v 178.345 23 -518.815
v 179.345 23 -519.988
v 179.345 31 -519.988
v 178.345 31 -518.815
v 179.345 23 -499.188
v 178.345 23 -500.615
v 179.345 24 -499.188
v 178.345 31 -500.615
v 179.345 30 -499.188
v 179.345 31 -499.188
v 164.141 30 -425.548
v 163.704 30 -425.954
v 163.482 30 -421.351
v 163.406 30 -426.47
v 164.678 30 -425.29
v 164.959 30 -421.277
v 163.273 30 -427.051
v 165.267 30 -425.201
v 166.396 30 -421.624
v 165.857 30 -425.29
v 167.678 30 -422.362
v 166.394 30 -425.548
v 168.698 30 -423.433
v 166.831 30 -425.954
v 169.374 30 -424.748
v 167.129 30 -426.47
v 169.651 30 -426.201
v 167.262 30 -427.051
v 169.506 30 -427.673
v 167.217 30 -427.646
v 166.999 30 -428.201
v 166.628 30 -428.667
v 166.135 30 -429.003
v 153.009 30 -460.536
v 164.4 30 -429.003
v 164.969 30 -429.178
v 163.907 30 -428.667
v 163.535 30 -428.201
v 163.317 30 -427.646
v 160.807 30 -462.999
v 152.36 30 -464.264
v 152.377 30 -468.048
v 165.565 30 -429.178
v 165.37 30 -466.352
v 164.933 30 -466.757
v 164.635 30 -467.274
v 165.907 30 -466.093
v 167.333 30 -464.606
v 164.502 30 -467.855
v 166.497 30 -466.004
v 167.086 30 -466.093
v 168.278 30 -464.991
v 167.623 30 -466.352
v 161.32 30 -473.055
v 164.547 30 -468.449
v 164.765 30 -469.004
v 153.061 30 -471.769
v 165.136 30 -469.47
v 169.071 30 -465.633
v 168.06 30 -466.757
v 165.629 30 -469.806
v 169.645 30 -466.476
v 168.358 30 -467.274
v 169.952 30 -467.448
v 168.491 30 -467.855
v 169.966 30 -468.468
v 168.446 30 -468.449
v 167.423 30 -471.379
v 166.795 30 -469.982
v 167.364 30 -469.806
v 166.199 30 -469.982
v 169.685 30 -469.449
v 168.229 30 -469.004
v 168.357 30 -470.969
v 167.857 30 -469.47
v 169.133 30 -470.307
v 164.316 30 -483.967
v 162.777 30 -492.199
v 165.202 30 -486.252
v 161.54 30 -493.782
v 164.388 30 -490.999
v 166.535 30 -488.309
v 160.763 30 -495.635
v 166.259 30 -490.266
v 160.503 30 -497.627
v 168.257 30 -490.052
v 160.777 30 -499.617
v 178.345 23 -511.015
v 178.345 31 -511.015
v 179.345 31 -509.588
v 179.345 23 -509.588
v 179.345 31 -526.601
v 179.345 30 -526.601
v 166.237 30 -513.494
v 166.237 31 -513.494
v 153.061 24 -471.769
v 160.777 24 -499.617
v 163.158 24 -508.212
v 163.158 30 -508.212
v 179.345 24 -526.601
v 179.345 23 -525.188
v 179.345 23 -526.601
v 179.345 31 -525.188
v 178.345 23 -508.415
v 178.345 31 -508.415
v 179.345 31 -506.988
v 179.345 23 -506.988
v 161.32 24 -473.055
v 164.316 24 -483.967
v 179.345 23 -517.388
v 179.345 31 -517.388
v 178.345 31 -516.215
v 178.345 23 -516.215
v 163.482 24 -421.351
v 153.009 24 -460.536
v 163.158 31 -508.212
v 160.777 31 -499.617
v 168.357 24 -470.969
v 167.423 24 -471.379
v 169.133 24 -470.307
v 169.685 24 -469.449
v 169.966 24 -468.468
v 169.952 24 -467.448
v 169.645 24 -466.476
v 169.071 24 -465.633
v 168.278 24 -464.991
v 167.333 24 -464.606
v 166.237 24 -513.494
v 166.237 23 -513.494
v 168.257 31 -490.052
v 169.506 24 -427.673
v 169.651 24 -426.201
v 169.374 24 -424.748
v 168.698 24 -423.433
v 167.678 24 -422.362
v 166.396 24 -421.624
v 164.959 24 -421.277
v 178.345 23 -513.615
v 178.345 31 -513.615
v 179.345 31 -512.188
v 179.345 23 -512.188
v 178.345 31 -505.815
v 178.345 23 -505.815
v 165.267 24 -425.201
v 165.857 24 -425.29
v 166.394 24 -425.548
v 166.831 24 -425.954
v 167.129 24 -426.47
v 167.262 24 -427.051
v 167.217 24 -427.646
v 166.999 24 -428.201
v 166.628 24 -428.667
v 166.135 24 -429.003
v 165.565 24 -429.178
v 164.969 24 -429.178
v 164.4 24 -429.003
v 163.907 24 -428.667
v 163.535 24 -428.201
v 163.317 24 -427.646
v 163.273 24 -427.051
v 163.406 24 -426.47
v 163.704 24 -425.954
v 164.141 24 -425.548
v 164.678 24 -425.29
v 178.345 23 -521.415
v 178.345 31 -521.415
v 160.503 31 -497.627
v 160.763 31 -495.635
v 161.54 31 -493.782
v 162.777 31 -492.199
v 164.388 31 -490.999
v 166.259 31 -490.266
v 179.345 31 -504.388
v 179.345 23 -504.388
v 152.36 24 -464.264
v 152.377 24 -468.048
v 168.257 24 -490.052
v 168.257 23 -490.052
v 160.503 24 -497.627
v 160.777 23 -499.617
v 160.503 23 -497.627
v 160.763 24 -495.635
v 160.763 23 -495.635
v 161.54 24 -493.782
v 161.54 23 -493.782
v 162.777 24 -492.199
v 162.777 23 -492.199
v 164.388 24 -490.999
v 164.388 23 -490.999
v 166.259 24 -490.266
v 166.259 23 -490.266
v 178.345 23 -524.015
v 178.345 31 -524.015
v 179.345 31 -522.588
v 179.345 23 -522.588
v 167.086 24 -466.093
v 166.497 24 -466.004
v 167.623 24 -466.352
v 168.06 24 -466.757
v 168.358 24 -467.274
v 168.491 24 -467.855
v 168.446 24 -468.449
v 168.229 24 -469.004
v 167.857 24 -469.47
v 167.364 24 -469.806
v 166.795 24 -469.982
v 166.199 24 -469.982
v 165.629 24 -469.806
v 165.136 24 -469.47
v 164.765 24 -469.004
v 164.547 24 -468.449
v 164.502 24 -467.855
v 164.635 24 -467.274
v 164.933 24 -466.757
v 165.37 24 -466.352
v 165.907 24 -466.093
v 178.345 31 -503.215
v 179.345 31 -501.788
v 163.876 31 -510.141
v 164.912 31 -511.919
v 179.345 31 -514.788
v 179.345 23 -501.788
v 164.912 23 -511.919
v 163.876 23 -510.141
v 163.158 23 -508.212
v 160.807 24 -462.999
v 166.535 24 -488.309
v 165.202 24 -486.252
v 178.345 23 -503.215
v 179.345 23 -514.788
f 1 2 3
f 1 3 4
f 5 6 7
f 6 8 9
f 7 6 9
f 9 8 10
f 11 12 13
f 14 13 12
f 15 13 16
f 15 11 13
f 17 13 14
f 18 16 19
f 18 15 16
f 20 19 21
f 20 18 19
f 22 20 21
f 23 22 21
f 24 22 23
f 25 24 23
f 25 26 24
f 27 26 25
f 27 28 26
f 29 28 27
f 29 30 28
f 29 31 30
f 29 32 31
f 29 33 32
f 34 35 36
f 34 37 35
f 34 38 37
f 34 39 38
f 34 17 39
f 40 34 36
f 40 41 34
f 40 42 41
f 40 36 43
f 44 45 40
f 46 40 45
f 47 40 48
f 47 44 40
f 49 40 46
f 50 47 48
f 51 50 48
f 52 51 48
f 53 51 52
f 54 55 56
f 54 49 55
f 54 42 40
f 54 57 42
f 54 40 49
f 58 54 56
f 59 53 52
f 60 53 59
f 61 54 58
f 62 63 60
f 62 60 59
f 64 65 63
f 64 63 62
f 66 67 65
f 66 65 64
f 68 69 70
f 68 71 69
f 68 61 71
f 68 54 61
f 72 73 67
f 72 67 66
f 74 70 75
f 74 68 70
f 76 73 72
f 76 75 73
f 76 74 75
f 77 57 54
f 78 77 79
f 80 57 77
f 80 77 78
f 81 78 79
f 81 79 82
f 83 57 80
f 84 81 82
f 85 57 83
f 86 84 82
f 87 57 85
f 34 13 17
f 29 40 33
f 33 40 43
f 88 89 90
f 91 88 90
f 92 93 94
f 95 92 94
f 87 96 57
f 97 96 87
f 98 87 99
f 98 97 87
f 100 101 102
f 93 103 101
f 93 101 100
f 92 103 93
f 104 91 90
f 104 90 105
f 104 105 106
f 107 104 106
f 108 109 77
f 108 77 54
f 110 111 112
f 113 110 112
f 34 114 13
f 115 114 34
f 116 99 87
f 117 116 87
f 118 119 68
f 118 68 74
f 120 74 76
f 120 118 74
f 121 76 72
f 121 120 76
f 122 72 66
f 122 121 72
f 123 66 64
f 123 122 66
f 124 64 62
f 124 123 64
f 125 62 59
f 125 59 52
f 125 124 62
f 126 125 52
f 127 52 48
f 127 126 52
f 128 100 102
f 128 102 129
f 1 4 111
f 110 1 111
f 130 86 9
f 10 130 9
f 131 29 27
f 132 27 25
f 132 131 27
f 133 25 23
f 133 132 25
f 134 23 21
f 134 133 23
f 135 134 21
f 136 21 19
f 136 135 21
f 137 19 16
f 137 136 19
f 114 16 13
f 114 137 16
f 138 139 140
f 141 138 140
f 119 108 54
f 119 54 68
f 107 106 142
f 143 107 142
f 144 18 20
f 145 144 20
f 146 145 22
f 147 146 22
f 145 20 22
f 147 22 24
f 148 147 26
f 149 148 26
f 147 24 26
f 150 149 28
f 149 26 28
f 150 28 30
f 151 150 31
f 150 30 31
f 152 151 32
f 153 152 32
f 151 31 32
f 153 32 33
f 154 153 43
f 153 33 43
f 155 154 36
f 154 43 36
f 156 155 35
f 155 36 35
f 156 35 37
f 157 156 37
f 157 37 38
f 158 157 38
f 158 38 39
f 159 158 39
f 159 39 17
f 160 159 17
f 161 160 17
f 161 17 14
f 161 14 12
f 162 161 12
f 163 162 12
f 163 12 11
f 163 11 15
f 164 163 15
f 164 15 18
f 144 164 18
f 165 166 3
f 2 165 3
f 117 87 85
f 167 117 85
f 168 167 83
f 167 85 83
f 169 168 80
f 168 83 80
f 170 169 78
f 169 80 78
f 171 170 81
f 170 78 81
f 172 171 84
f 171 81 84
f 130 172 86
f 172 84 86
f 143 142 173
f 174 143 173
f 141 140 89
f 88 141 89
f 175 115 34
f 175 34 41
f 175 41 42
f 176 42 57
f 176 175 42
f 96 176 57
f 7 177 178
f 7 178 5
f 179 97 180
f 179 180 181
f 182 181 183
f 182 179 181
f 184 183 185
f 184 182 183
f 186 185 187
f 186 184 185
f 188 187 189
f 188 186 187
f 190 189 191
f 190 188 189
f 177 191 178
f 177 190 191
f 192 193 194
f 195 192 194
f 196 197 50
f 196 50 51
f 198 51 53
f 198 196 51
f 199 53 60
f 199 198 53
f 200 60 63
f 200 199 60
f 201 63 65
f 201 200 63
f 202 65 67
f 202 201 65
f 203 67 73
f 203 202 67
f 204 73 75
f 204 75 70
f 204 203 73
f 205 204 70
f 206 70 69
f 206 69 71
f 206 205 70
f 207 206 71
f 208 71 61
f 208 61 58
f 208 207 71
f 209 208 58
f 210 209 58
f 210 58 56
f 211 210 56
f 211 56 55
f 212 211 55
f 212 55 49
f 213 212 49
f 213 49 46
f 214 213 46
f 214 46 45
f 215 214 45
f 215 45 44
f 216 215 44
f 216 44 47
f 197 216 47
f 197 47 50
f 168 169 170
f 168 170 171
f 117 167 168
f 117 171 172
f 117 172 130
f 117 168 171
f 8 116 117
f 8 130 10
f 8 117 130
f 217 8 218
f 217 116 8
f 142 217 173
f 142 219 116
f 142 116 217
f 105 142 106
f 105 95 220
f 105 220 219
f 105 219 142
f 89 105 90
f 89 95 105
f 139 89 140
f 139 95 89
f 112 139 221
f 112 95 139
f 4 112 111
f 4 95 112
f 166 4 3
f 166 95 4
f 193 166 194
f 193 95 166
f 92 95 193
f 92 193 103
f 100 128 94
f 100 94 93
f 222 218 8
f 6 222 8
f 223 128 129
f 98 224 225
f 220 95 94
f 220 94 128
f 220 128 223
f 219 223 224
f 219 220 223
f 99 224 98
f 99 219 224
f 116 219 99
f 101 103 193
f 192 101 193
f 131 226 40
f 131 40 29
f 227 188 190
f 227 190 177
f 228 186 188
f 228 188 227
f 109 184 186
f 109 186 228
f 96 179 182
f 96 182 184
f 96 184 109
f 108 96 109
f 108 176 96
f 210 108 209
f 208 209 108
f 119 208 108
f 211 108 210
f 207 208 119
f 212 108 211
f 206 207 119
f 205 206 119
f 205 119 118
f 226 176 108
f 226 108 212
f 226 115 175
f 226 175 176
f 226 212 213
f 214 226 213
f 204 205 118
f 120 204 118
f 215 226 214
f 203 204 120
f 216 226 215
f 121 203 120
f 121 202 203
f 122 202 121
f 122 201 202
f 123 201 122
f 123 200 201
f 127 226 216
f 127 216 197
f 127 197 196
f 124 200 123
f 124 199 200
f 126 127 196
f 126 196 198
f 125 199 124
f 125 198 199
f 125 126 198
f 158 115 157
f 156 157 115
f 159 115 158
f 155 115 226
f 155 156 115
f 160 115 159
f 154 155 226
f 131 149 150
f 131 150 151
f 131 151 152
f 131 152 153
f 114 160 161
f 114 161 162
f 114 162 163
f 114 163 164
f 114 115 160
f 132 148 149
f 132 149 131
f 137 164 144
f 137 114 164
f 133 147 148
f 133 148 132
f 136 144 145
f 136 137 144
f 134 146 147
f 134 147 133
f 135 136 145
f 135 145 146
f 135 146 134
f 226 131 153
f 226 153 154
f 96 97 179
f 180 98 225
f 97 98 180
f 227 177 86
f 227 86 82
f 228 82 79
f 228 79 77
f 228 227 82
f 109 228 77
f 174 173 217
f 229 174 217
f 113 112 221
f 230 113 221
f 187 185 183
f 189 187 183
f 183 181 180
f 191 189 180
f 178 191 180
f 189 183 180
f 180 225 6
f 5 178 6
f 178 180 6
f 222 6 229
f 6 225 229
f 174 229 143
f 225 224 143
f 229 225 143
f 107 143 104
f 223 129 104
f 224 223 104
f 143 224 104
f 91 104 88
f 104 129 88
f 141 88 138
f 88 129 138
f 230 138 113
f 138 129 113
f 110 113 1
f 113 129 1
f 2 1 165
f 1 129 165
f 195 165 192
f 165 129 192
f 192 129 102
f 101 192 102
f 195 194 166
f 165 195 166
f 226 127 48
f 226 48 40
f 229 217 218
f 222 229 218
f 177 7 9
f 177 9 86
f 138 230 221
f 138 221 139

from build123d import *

# Parameters (mm, degrees)
BOSS_EXTRUDE1_DEPTH = 50
SKETCH2_R           = 10
CUT_EXTRUDE1_DEPTH  = 145
SKETCH3_R           = 10
CUT_EXTRUDE2_DEPTH  = 145
SCALE1_SCALE        = 0.2
BOSS_EXTRUDE2_START = -10
SKETCH4_R           = 2
BOSS_EXTRUDE2_DEPTH = 10
CUT_EXTRUDE3_DEPTH  = 4
SKETCH6_R           = 2
BOSS_EXTRUDE3_DEPTH = 6
BOSS_EXTRUDE4_DEPTH = 1
CUT_EXTRUDE4_DEPTH  = 10
LPATTERN1_COUNT     = 5
LPATTERN1_PITCH     = 5.2


with BuildPart() as part:
    # Sketch1 → Boss-Extrude1 (new body)
    with BuildSketch(Plane(origin=(0, 0, 0), x_dir=(1, 0, 0), z_dir=(0, 1, 0))):
        with BuildLine():
            Line((156.72428326, 188.749431717), (104.362522104, 384.675710784))
            ThreePointArc((104.362522104, 384.675710784), (100.737911875, 412.774532685), (104.619514578, 440.839007595))
            Line((104.619514578, 440.839007595), (155.108674524, 623.056486958))
            ThreePointArc((155.108674524, 623.056486958), (161.096577838, 637.255812747), (170.503706822, 649.461621332))
            Line((170.503706822, 649.461621332), (236.039412862, 714.997327373))
            Line((236.039412862, 714.997327373), (236.039412862, 577.933775776))
            Line((236.039412862, 577.933775776), (180.600392658, 532.253421954))
            ThreePointArc((180.600392658, 532.253421954), (168.395698805, 518.565657016), (160.895546094, 501.83074828))
            Line((160.895546094, 501.83074828), (142.173951469, 433.630653577))
            ThreePointArc((142.173951469, 433.630653577), (140.038780006, 418.542072662), (141.773673112, 403.40224515))
            Line((141.773673112, 403.40224515), (186.844856765, 220.358050312))
            ThreePointArc((186.844856765, 220.358050312), (180.4464863, 196.299603446), (156.72428326, 188.749431717))
        make_face()
    extrude(amount=BOSS_EXTRUDE1_DEPTH)

    # Sketch2 → Cut-Extrude1 (cut)
    with BuildSketch(Plane(origin=(0, 50, 0), x_dir=(1, 0, 0), z_dir=(0, 1, 0))):
        with Locations(Location((120.492692433, 416.694560019, 0), (0, 0, 270))):
            Circle(SKETCH2_R)
    extrude(amount=-CUT_EXTRUDE1_DEPTH, mode=Mode.SUBTRACT)

    # Sketch3 → Cut-Extrude2 (cut)
    with BuildSketch(Plane(origin=(0, 50, 0), x_dir=(1, 0, 0), z_dir=(0, 1, 0))):
        with Locations(Location((165.652720942, 217.997652258, 0), (0, 0, 270))):
            Circle(SKETCH3_R)
    extrude(amount=-CUT_EXTRUDE2_DEPTH, mode=Mode.SUBTRACT)


with BuildPart() as part_1:
    # Scale1: scaled about (165.170943501, 25, -479.501481674)
    add(part.part.scale(SCALE1_SCALE).moved(Location((132.136754801, 20, -383.601185339))))

    # Sketch4 → Boss-Extrude2 (add)
    with BuildSketch(Plane(origin=(0, 30, 0), x_dir=(1, 0, 0), z_dir=(0, 1, 0)).offset(BOSS_EXTRUDE2_START)):
        with BuildLine():
            Line((167.333433502, 464.60578312), (160.807348984, 462.998857787))
            Line((160.807348984, 462.998857787), (160.491489423, 464.281634369))
            ThreePointArc((160.491489423, 464.281634369), (160.144510802, 467.309599871), (160.571545095, 470.327316054))
            Line((160.571545095, 470.327316054), (161.32024353, 473.054717497))
            Line((161.32024353, 473.054717497), (167.42312855, 471.379415727))
            ThreePointArc((167.42312855, 471.379415727), (169.9963123, 467.957931993), (167.333433502, 464.60578312))
        make_face()
        with Locations(Location((166.496619113, 468.004274209, 0), (0, 0, 270))):
            Circle(SKETCH4_R, mode=Mode.SUBTRACT)
    extrude(amount=BOSS_EXTRUDE2_DEPTH)

    # Sketch5 → Cut-Extrude3 (cut)
    with BuildSketch(Plane.XZ.offset(-20)):
        with BuildLine():
            Line((167.333433502, -464.60578312), (160.807348984, -462.998857787))
            Line((160.807348984, -462.998857787), (169.505726154, -427.672795401))
            ThreePointArc((169.505726154, -427.672795401), (168.226052061, -422.861106028), (163.481611453, -421.351071682))
            Line((163.481611453, -421.351071682), (153.009259222, -460.536327496))
            ThreePointArc((153.009259222, -460.536327496), (152.284337176, -466.156091876), (153.060657717, -471.768986858))
            Line((153.060657717, -471.768986858), (163.158489706, -508.21248273))
            ThreePointArc((163.158489706, -508.21248273), (164.356070369, -511.052347888), (166.237496165, -513.493509605))
            Line((166.237496165, -513.493509605), (179.344637373, -526.600650813))
            Line((179.344637373, -526.600650813), (179.344637373, -499.187940494))
            Line((179.344637373, -499.187940494), (168.256833333, -490.05186973))
            ThreePointArc((168.256833333, -490.05186973), (165.815894562, -487.314316742), (164.31586402, -483.967334995))
            Line((164.31586402, -483.967334995), (161.32024353, -473.054717497))
            Line((161.32024353, -473.054717497), (167.42312855, -471.379415727))
            ThreePointArc((167.42312855, -471.379415727), (169.9963123, -467.957931993), (167.333433502, -464.60578312))
        make_face()
    extrude(amount=-CUT_EXTRUDE3_DEPTH, mode=Mode.SUBTRACT)

    # Sketch6 → Boss-Extrude3 (add)
    with BuildSketch(Plane(origin=(0, 30, 0), x_dir=(1, 0, 0), z_dir=(0, 1, 0))):
        with Locations((156.235293288, 466.940097343)):
            Circle(SKETCH6_R)
    extrude(amount=-BOSS_EXTRUDE3_DEPTH)

    # Sketch7 → Boss-Extrude4 (add)
    with BuildSketch(Plane(origin=(0, 30, 0), x_dir=(1, 0, 0), z_dir=(0, 1, 0))):
        with BuildLine():
            Line((179.344637373, 526.600650813), (166.237496165, 513.493509605))
            ThreePointArc((166.237496165, 513.493509605), (164.356070369, 511.052347888), (163.158489706, 508.21248273))
            Line((163.158489706, 508.21248273), (160.776954555, 499.617423264))
            ThreePointArc((160.776954555, 499.617423264), (162.10559666, 492.949108842), (168.256833333, 490.05186973))
            Line((168.256833333, 490.05186973), (179.344637373, 499.187940494))
            Line((179.344637373, 499.187940494), (179.344637373, 526.600650813))
        make_face()
    boss_extrude4 = extrude(amount=BOSS_EXTRUDE4_DEPTH)

    # Mirror2: Boss-Extrude4 across plane
    add(boss_extrude4.mirror(Plane.ZX.offset(27)))

    # Sketch8 → Cut-Extrude4 (cut)
    with BuildSketch(Plane(origin=(0, 31, 0), x_dir=(1, 0, 0), z_dir=(0, 1, 0))):
        Polygon((178.344637373, 500.614741506), (179.344637373, 499.187940494), (179.344637373, 501.787940494), align=None)
        Polygon((178.344637373, 503.214741506), (179.344637373, 501.787940494), (179.344637373, 504.387940494), align=None)
    cut_extrude4 = extrude(amount=-CUT_EXTRUDE4_DEPTH, mode=Mode.SUBTRACT)

    # LPattern1: Cut-Extrude4 ×5
    with Locations(*[(0, 0, -i * LPATTERN1_PITCH) for i in range(1, LPATTERN1_COUNT)]):
        add(cut_extrude4, mode=Mode.SUBTRACT)


solid = part_1.part
